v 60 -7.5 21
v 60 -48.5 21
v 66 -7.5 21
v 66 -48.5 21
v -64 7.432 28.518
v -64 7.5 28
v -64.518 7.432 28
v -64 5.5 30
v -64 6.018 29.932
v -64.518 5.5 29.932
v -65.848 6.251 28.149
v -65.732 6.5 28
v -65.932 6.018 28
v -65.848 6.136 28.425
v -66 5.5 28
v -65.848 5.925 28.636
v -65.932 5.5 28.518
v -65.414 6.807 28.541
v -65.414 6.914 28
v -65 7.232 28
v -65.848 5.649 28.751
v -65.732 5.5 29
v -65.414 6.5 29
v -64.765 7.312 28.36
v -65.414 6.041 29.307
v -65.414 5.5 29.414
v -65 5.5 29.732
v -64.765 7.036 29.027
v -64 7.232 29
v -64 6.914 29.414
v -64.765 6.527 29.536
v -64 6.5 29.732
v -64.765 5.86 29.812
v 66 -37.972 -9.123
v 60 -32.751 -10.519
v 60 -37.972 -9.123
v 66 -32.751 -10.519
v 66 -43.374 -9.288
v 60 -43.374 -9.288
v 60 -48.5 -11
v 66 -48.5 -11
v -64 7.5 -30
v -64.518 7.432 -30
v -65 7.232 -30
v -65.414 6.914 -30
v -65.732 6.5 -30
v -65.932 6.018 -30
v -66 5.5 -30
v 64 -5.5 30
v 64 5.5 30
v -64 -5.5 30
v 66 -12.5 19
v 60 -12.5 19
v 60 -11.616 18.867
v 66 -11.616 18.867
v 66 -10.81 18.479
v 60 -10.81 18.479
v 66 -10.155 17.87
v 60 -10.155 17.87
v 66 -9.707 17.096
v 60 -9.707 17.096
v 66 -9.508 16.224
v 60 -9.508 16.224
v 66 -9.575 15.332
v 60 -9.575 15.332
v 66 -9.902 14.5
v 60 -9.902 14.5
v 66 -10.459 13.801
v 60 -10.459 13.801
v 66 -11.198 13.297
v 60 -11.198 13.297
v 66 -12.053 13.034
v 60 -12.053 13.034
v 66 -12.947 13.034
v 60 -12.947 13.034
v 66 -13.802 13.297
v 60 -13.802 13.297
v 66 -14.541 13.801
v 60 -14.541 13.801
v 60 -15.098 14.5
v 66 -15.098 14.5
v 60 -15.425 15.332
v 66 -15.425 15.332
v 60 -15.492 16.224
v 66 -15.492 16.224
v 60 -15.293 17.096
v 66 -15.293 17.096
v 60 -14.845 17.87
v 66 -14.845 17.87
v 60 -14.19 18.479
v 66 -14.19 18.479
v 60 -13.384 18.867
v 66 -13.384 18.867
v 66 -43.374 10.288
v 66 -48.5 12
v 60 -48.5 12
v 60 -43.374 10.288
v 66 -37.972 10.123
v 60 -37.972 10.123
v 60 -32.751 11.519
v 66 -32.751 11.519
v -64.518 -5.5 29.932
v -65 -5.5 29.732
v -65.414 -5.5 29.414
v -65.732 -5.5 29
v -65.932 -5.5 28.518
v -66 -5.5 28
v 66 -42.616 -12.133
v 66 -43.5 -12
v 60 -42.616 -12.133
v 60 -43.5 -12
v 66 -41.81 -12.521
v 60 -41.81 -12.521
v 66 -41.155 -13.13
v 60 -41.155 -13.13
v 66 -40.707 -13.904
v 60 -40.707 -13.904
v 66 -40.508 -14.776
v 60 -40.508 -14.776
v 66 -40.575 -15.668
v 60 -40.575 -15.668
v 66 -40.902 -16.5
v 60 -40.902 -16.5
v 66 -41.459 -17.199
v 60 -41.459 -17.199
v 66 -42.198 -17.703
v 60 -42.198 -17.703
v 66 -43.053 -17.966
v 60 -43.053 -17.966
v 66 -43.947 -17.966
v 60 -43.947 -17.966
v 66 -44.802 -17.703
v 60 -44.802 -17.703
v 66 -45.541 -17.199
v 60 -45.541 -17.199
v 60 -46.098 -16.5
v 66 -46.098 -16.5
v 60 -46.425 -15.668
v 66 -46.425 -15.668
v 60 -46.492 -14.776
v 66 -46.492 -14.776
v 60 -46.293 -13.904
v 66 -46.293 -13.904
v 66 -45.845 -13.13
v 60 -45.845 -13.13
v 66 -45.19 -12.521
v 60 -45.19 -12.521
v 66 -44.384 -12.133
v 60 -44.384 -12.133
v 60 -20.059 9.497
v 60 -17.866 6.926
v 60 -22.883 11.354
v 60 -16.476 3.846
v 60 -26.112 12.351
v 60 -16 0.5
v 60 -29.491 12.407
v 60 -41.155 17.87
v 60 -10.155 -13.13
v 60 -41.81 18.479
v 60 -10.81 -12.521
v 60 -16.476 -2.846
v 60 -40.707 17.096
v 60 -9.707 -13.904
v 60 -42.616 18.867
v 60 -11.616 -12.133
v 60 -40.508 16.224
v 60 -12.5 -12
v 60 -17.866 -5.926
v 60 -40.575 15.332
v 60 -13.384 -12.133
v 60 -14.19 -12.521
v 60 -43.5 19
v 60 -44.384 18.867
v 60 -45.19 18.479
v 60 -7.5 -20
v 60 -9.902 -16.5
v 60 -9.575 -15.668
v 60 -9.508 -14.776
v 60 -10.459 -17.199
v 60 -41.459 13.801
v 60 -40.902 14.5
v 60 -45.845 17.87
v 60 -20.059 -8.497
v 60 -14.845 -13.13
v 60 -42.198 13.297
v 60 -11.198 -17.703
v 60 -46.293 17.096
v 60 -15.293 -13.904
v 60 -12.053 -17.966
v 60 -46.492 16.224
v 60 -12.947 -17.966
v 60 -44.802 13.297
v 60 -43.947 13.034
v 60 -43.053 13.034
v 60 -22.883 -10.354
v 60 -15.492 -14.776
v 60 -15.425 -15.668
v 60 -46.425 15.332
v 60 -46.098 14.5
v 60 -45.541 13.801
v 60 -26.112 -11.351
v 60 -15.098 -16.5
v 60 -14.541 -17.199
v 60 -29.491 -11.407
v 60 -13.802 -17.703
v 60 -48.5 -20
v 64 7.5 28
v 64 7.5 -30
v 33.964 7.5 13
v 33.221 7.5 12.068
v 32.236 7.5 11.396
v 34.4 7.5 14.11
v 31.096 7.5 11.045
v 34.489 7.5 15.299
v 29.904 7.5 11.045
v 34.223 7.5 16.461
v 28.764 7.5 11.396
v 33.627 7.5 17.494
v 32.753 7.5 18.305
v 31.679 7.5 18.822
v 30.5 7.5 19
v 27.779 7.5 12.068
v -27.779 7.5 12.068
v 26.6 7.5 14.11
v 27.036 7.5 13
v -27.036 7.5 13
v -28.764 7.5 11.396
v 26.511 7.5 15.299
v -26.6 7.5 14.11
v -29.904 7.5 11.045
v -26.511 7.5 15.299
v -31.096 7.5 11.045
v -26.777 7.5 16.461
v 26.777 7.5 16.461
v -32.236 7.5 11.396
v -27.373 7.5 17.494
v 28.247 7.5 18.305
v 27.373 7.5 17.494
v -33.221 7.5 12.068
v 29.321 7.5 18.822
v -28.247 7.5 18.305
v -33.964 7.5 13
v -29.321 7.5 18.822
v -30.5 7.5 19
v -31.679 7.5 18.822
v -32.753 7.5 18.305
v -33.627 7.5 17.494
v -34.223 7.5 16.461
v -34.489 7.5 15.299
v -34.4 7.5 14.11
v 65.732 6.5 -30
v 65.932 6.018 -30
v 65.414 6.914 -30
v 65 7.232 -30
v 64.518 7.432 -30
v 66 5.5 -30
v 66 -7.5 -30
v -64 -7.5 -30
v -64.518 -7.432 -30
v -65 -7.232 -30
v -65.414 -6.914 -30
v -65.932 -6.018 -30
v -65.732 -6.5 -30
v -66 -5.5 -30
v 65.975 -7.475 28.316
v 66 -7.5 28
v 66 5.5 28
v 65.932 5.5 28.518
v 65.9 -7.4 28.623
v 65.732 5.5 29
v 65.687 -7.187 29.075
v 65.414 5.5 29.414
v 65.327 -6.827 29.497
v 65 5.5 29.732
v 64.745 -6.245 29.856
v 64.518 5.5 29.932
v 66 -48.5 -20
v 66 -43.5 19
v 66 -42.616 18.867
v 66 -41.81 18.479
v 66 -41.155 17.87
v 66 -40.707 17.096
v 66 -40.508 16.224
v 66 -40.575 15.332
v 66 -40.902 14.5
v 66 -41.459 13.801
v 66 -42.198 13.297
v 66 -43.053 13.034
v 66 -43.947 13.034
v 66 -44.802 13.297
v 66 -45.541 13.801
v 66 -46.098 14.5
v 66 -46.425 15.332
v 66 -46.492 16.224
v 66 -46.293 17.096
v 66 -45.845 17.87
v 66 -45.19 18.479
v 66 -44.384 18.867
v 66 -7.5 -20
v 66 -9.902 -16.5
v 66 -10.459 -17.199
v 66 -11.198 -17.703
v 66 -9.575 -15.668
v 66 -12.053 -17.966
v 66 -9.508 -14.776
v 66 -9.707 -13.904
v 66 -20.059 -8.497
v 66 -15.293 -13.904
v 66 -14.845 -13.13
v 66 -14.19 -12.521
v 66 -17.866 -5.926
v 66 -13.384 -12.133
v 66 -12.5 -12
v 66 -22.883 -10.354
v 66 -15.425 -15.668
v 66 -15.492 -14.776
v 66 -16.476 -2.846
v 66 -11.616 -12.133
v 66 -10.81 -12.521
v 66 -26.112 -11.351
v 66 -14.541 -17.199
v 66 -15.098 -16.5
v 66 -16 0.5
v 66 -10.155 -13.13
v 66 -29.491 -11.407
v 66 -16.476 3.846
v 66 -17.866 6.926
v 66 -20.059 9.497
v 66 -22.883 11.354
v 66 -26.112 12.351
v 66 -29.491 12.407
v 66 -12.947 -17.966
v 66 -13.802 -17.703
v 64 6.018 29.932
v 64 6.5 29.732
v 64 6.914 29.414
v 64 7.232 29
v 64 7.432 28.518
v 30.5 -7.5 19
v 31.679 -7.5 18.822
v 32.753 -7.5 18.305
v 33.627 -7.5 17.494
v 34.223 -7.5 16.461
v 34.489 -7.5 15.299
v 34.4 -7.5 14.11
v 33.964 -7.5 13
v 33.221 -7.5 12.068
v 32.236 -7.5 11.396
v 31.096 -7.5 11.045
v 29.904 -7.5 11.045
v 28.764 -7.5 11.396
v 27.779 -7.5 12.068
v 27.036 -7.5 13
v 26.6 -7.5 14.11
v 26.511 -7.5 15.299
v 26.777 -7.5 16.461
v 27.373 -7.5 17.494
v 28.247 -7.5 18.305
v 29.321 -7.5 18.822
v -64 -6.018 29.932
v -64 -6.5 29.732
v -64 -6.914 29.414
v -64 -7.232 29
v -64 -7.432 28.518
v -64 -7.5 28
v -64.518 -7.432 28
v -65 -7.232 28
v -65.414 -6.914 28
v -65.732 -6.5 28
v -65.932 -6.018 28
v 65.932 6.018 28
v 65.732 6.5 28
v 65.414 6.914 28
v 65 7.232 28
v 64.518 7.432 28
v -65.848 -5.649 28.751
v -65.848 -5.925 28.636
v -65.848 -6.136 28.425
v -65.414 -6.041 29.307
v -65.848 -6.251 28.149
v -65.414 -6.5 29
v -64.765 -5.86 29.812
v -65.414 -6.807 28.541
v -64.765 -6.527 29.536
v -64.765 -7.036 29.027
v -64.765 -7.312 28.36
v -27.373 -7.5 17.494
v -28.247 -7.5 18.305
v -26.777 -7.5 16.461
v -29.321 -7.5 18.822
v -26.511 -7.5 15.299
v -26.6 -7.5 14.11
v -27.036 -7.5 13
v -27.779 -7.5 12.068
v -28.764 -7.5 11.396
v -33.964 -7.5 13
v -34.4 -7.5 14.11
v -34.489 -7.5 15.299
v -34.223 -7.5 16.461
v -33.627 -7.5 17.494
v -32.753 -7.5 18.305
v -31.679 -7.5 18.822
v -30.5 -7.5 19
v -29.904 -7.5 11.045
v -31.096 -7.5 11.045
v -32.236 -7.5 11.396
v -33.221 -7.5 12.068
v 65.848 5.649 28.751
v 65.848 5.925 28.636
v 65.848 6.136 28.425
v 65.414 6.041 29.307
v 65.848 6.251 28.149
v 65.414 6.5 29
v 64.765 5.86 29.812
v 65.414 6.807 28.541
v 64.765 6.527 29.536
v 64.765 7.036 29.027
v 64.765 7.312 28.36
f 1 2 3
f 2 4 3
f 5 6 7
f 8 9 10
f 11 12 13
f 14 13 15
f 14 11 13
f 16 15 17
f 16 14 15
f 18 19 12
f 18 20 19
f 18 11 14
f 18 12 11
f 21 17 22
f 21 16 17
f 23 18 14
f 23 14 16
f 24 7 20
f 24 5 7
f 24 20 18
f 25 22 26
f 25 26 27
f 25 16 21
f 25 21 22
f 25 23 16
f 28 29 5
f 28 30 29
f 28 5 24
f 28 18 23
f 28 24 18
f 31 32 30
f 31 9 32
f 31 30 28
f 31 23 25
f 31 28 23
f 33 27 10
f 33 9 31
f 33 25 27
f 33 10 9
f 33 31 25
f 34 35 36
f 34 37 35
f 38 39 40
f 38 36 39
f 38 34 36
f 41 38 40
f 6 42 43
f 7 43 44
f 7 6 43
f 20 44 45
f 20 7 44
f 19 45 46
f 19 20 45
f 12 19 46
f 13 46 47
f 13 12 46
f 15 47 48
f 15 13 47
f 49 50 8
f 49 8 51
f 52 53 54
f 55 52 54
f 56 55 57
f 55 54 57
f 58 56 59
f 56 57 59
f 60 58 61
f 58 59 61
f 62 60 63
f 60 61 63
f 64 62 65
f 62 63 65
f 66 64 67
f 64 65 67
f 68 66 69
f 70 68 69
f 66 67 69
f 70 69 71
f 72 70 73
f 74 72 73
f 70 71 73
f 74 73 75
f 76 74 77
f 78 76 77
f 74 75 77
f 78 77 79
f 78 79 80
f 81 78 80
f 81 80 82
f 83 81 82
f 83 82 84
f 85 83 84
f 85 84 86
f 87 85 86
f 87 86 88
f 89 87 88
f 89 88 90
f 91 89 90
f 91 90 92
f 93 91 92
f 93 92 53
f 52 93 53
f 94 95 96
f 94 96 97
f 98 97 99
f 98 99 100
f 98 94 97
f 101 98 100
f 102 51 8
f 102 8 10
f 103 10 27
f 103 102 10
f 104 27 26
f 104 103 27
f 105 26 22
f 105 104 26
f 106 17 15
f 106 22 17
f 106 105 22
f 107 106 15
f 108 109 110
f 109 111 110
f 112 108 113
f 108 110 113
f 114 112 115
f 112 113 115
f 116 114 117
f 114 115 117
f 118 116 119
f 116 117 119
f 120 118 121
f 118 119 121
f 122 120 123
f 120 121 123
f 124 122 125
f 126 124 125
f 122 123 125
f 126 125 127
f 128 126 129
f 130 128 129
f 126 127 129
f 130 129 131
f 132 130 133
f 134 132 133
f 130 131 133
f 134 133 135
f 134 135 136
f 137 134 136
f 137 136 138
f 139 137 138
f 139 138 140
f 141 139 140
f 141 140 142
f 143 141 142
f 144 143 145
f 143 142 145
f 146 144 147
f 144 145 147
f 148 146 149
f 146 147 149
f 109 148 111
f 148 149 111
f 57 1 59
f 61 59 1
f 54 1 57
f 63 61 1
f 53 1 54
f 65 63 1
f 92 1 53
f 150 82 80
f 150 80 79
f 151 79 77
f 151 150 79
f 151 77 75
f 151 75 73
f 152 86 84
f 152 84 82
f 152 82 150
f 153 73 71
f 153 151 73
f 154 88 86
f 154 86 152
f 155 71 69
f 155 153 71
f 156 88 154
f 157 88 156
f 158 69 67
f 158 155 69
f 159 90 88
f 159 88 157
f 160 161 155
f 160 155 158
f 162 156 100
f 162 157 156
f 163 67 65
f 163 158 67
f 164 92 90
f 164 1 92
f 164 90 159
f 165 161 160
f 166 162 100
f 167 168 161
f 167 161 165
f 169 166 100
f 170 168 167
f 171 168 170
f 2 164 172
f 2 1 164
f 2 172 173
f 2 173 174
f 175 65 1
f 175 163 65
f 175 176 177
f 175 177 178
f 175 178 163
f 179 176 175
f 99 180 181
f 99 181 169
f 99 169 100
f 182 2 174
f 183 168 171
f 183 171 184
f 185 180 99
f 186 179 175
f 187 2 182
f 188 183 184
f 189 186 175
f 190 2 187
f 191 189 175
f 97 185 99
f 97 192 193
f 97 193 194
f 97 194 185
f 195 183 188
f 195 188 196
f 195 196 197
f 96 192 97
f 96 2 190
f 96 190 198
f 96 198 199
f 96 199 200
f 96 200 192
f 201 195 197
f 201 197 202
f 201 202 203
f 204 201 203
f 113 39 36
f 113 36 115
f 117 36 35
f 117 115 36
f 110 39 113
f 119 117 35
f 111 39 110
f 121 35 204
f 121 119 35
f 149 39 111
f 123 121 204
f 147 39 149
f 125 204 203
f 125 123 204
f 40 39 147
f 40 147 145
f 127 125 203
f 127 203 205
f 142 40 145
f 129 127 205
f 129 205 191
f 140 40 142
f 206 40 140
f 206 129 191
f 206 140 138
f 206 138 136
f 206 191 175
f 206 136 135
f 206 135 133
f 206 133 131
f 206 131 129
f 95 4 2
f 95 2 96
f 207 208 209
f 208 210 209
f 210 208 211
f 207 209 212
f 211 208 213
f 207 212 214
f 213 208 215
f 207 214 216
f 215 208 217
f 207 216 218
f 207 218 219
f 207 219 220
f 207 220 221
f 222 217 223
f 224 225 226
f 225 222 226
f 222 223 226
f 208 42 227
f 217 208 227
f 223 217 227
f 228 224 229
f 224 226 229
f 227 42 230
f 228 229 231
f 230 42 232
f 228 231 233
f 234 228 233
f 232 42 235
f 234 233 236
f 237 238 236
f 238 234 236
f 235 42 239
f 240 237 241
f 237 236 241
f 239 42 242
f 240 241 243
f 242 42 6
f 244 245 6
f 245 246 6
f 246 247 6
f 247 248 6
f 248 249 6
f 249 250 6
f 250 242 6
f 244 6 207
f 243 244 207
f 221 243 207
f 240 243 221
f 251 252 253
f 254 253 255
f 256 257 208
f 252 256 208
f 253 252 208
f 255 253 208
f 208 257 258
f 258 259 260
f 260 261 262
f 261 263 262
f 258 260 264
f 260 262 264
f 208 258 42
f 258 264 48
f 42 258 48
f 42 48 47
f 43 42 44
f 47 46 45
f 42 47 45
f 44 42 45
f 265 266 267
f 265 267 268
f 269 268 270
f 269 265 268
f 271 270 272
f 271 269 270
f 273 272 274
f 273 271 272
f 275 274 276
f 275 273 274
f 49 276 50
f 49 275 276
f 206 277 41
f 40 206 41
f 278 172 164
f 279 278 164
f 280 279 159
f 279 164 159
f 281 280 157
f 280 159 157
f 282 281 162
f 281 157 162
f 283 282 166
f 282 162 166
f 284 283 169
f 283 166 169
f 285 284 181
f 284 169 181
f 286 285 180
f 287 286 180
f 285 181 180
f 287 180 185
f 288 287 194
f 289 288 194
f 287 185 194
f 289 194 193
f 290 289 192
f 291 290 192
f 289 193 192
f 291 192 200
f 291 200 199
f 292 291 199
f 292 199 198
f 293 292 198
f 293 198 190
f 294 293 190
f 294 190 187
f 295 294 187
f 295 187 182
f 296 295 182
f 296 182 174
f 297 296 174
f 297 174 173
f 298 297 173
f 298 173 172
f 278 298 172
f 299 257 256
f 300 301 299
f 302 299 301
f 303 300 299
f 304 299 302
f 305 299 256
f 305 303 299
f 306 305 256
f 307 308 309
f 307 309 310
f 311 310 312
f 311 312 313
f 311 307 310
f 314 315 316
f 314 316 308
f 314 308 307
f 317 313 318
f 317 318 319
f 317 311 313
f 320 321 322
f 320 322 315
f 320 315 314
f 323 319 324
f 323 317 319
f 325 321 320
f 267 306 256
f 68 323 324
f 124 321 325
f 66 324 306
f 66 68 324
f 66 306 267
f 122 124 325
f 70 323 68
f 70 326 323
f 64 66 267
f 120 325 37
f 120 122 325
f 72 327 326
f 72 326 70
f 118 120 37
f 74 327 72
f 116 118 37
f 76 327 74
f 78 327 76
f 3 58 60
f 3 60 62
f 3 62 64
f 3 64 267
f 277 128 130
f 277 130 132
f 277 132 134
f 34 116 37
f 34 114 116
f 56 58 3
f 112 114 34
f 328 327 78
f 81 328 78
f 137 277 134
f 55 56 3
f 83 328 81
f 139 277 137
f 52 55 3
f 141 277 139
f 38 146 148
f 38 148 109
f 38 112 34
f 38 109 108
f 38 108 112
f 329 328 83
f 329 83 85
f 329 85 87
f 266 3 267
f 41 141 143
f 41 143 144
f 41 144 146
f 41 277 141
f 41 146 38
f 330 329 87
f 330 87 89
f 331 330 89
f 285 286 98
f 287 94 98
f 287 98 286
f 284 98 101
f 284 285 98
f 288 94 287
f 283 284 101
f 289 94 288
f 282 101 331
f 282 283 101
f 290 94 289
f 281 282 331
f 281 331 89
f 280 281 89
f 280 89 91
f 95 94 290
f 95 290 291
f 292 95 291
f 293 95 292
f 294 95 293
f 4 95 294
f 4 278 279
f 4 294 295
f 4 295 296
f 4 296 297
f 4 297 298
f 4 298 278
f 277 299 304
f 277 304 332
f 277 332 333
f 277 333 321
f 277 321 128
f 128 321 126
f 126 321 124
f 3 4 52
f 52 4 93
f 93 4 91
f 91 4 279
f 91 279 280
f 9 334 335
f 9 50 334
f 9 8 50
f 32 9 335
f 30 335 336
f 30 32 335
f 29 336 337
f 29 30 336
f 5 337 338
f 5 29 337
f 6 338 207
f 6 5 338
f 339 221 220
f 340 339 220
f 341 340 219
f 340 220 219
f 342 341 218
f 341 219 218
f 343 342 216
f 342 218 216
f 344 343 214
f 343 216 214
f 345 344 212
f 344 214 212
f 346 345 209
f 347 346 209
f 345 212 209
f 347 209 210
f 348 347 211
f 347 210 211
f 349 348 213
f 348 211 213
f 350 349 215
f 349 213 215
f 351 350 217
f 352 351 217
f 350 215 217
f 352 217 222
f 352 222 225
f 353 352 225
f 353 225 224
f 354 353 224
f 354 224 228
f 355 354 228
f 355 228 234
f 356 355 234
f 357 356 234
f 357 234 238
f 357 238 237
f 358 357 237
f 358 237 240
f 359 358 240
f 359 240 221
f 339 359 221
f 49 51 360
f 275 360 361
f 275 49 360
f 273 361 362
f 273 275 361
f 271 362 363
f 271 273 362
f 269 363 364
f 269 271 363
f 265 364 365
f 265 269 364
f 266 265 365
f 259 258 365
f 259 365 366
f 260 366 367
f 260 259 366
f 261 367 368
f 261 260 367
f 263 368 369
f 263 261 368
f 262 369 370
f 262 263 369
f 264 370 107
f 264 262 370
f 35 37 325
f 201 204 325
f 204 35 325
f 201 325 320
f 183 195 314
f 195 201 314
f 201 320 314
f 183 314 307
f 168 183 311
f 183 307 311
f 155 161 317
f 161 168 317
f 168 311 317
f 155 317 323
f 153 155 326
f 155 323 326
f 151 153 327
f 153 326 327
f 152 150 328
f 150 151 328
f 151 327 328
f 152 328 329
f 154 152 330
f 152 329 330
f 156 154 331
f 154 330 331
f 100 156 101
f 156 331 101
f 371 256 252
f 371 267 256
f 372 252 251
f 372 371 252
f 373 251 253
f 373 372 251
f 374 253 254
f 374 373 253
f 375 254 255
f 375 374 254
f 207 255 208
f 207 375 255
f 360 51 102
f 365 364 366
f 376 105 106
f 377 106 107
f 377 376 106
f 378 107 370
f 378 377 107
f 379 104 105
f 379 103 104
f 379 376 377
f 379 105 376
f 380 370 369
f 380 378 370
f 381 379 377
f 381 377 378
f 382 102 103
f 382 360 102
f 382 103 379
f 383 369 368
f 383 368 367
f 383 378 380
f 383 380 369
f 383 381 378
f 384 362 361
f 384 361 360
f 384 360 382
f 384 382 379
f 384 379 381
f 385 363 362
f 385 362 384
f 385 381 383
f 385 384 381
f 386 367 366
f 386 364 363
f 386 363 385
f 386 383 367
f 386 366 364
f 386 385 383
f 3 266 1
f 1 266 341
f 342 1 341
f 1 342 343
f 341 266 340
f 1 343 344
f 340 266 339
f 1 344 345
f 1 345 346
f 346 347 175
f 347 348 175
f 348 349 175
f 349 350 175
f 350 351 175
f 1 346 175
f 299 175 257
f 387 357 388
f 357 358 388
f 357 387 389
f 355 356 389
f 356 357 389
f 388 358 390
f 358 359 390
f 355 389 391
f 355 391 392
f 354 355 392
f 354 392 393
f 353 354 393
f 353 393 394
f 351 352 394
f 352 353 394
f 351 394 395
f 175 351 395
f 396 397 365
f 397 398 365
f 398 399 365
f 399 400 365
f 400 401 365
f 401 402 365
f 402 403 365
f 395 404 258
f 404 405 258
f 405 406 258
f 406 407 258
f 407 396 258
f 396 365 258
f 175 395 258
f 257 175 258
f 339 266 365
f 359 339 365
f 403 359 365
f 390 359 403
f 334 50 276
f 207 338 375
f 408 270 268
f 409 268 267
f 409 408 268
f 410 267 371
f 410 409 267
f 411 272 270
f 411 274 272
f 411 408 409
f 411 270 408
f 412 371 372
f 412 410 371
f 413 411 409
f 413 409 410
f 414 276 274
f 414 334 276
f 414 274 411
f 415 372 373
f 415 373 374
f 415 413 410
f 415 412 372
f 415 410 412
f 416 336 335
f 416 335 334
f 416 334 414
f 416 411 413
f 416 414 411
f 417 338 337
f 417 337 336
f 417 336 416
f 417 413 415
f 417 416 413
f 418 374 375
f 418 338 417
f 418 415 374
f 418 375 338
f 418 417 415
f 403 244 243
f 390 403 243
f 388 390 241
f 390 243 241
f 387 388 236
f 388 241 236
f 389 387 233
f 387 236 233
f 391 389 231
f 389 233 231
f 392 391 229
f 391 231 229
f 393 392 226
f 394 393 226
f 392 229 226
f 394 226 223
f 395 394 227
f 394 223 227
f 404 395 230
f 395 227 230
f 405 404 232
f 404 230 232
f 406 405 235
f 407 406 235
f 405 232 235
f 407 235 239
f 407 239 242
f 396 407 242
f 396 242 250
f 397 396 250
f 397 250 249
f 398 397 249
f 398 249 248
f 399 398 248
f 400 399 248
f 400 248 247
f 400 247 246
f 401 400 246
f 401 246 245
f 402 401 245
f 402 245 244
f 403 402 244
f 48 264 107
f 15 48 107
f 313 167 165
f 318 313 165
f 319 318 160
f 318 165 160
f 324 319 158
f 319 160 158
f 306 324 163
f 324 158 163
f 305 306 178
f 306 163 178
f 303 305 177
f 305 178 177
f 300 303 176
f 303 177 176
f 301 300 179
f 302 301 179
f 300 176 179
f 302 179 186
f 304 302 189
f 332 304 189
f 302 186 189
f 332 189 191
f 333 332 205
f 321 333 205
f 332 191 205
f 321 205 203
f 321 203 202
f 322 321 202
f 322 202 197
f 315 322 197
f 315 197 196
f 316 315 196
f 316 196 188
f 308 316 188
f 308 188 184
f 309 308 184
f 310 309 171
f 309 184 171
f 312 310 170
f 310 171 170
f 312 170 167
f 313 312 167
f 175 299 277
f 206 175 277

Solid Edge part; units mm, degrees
sketch "Sketch1" plane through (0, 0, 0) normal (1, 0, 0) x (0, 1, 0)
  line L0 (7.5, 30) -> (-7.5, 30)
  line L1 (-7.5, 30) -> (-7.5, -30)
  line L2 (-7.5, -30) -> (7.5, -30)
  line L3 (7.5, -30) -> (7.5, 30)
extrude "largo" add sketch "Sketch1" along normal mid plane 132
hole "Hole1" at (30.5, 7.5, 15) direction (0, -1, 0) diameter 8 end up to next
hole "Hole2" at (-30.5, 7.5, 15) direction (0, -1, 0) diameter 8 end up to next
sketch "Sketch2" plane through (66, 0, 0) normal (1, 0, 0) x (0, 1, 0)
  arc A0 (-48.5, -11) -> (-32.7514, -10.5193) centre (-40.1119, -27.5899) cw
  line L0 (-48.5, -20) -> (-48.5, -11)
  line L1 (-7.5, -20) -> (-48.5, -20)
  line L2 (-7.5, 21) -> (-7.5, -20)
  line L3 (-48.5, 21) -> (-7.5, 21)
  line L4 (-48.5, 21) -> (-48.5, 12)
  arc A1 (-48.5, 12) -> (-32.7514, 11.5193) centre (-40.1119, 28.5899) ccw
  arc A2 (-32.7514, 11.5193) -> (-32.7514, -10.5193) centre (-28, 0.5) cw
extrude "Protrusion1" add sketch "Sketch2" against normal blind 6
hole "Agujero_7" at (60, -12.5, 16) direction (1, 0, 0) diameter 6 end up to next
hole "Hole3" at (60, -43.5, 16) direction (1, 0, 0) diameter 6 end up to next
hole "Hole4" at (60, -43.5, -15) direction (1, 0, 0) diameter 6 end up to next
hole "Hole5" at (60, -12.5, -15) direction (1, 0, 0) diameter 6 end up to next
fillet "Redondeo_1" radius 2 7 edges at (0, 7.5, 30) (0, -7.5, 30) (-66, 7.5, 0) (-66, -7.5, 0) (66, 7.5, 0) (66, 0, 30) (-66, 0, 30)
